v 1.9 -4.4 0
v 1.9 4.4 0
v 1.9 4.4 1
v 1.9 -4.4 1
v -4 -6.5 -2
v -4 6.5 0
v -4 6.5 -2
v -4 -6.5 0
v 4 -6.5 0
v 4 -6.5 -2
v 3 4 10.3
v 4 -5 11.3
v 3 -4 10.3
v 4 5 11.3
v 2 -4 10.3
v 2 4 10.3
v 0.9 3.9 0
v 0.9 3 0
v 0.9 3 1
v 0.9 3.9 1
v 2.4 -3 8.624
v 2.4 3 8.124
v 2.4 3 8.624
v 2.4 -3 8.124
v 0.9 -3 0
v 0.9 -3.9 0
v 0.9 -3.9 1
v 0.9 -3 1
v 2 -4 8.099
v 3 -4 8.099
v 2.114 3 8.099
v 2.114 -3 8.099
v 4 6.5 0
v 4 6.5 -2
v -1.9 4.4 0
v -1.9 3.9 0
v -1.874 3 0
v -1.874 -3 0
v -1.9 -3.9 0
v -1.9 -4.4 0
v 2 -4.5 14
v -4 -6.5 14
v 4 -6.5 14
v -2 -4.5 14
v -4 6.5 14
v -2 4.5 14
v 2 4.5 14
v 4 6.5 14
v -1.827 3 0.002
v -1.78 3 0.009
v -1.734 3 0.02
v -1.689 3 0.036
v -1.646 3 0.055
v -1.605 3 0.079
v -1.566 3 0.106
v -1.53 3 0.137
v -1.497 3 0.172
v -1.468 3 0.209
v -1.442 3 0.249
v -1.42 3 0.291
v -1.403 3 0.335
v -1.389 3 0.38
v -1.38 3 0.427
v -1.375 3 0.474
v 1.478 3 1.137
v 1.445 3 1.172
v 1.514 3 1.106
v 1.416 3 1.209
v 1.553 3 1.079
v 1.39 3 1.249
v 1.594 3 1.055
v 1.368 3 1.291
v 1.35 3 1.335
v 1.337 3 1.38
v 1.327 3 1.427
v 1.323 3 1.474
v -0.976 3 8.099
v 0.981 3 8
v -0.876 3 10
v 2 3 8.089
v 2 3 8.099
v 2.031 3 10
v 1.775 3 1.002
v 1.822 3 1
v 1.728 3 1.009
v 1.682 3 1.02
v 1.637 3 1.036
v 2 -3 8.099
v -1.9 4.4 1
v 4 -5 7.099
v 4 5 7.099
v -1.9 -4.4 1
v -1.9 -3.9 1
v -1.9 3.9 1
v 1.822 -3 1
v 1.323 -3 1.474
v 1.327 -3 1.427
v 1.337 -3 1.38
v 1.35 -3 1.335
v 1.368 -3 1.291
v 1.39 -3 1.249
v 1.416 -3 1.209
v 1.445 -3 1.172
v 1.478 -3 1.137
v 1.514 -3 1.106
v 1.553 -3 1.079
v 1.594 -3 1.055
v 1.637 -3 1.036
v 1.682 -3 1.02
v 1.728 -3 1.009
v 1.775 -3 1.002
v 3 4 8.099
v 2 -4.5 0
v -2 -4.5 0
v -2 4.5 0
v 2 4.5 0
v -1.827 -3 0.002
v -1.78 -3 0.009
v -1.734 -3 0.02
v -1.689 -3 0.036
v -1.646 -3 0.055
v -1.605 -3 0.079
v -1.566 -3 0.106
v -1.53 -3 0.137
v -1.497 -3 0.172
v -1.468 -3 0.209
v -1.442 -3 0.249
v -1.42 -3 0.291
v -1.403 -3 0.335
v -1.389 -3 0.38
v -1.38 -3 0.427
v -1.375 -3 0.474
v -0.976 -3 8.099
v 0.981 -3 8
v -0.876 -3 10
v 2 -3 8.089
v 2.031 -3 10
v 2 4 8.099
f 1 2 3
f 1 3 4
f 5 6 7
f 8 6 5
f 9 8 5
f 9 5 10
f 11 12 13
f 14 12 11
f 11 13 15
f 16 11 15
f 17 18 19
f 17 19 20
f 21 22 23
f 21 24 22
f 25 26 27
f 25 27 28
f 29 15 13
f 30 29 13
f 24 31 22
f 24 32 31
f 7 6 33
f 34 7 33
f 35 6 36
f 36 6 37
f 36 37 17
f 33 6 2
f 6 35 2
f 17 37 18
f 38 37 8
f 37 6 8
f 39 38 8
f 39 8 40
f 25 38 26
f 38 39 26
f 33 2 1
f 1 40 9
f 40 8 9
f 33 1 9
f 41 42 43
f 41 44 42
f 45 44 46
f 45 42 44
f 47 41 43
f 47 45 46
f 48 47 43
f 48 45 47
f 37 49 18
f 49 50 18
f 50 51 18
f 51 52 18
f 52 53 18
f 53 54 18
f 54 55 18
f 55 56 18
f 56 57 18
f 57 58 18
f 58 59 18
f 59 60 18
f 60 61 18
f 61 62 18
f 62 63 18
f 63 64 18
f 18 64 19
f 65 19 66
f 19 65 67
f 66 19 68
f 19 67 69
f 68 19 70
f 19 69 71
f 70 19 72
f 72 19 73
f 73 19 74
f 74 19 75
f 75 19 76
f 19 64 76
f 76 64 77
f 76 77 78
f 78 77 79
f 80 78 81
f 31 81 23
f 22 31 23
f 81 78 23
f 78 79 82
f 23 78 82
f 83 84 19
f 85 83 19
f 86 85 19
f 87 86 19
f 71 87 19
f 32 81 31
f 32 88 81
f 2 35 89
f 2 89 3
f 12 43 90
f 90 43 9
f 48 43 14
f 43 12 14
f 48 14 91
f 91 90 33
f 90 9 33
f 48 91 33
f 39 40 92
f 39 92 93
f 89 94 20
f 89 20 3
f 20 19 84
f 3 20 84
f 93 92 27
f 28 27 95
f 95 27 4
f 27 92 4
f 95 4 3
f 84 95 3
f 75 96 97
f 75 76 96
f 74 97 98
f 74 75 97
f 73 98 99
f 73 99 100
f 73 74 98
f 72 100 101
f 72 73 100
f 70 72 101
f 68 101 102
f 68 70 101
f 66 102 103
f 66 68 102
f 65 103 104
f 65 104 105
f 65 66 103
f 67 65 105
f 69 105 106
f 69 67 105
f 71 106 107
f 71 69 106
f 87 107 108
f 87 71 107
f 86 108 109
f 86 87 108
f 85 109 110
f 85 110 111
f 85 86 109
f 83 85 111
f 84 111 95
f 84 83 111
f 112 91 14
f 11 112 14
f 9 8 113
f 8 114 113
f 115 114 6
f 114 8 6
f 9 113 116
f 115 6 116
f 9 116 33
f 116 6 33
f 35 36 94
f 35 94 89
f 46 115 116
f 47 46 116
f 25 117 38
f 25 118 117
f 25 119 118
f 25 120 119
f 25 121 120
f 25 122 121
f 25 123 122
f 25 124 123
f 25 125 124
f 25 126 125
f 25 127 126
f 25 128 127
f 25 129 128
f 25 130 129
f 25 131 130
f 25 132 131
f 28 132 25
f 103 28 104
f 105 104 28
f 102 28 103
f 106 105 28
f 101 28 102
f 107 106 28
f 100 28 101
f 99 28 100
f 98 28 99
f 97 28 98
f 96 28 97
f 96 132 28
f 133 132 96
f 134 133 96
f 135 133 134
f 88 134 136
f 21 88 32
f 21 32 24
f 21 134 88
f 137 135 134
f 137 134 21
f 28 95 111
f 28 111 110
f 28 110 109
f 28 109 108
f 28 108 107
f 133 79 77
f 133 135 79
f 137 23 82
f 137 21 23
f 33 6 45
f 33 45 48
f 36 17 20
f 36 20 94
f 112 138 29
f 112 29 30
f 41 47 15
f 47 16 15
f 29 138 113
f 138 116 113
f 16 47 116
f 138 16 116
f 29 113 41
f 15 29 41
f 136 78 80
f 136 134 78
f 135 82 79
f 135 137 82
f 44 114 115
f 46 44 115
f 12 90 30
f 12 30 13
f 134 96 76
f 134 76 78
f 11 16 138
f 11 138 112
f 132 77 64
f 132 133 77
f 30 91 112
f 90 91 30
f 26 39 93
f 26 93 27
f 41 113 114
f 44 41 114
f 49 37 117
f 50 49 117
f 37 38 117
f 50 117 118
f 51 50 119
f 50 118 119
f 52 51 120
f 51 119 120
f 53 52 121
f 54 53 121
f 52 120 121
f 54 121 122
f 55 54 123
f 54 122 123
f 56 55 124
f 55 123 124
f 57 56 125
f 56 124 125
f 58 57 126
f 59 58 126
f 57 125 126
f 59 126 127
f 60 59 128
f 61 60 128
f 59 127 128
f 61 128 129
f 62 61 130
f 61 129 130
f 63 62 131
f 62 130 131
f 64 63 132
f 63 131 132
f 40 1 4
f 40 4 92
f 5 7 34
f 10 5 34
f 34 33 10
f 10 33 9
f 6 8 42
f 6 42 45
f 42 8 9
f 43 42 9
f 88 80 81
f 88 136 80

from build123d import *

# Parameters (mm, degrees)
F0_W          = 8
F0_H          = 13
F1_DEPTH      = 14
F3_W          = 8
F3_H          = 13
F3_W_2        = 4
F3_H_2        = 9
F3_W_3        = 2.8
F3_H_3        = 7.8
F4_DEPTH      = 2
F5_DEPTH      = 1
F6_DEPTH      = 3
F6_DEPTH_BACK = 3
F7_R          = 0.5
F8_DEPTH      = 4
F8_DEPTH_BACK = 4
F9_SIZE       = 1


with BuildPart() as f1:
    # F0 (on Top) → F1 (new body)
    with BuildSketch(Plane.XY):
        Rectangle(F0_W, F0_H)
        Polygon((-2, 0), (-2, 4.5), (0, 4.5), (2, 4.5), (2, 0), (2, -4.5), (0, -4.5), (-2, -4.5), align=None, mode=Mode.SUBTRACT)
    extrude(amount=F1_DEPTH)

    # F2 (on Front) → F8 (cut, two sides)
    with BuildSketch(Plane.XZ) as f8_sk:
        Polygon((2, 10.3), (2, 10), (2.03134729, 10), (2.4, 10), (2.4, 8.6241693561), (2.4, 8.1241693561), (2.4, 8.0991693561), (5.4, 8.0991693561), (5.4, 10.3), align=None)
        Polygon((-1.5, 8.0991693561), (-1.4, 8.0991693561), (-1.4, 10), (-0.8759222072, 10), (2, 10), (2, 10.3), (-1.5, 10.3), align=None)
        Polygon((-1.4, 8.0991693561), (-0.97554052, 8.0991693561), (-0.8759222072, 10), (-1.4, 10), align=None)
        Polygon((2.4, 10), (2.03134729, 10), (2.4, 8.6241693561), align=None)
        Polygon((-0.8759222072, 10), (-0.97554052, 8.0991693561), (2, 8.0991693561), (2, 10), align=None)
        Polygon((2, 10), (2, 8.0991693561), (2.1142486924, 8.0991693561), (2.4, 8.1241693561), (2.4, 8.6241693561), (2.03134729, 10), align=None)
        Polygon((2.4, 8.1241693561), (2.1142486924, 8.0991693561), (2.4, 8.0991693561), align=None)
    extrude(amount=-F8_DEPTH, mode=Mode.SUBTRACT)
    extrude(f8_sk.sketch, amount=F8_DEPTH_BACK, mode=Mode.SUBTRACT)

    # F9
    f9_edges = [f1.edges().sort_by_distance(p)[0] for p in [
        (4, 0, 10.3),
        (4, 4, 9.199585),
        (4, 0, 8.099169),
        (4, -4, 9.199585),
    ]]
    chamfer(f9_edges, length=F9_SIZE)


with BuildPart() as f4:
    # F3 (on face) → F4 (new body)
    with BuildSketch(Plane(origin=(0, 0, 0), x_dir=(1, 0, 0), z_dir=(0, 0, -1))):
        Rectangle(F3_W, F3_H)
        Rectangle(F3_W_2, F3_H_2, mode=Mode.SUBTRACT)
        Rectangle(F3_W_2, F3_H_2)
        Polygon((-1.9, 3.9), (-1.9, 4.4), (1.9, 4.4), (1.9, -4.4), (-1.9, -4.4), (-1.9, -3.9), align=None, mode=Mode.SUBTRACT)
        with Locations((-0.5, 0)):
            Rectangle(F3_W_3, F3_H_3)
        Polygon((1.9, 4.4), (-1.9, 4.4), (-1.9, 3.9), (0.9, 3.9), (0.9, -3.9), (-1.9, -3.9), (-1.9, -4.4), (1.9, -4.4), align=None)
    extrude(amount=F4_DEPTH)

    # F3 (on face) → F5 (join)
    with BuildSketch(Plane(origin=(0, 0, 0), x_dir=(1, 0, 0), z_dir=(0, 0, -1))):
        Polygon((1.9, 4.4), (-1.9, 4.4), (-1.9, 3.9), (0.9, 3.9), (0.9, -3.9), (-1.9, -3.9), (-1.9, -4.4), (1.9, -4.4), align=None)
    extrude(amount=-F5_DEPTH)

    # F2 (on Front) → F6 (join, two sides)
    with BuildSketch(Plane.XZ) as f6_sk:
        Polygon((-0.97554052, 8.0991693561), (-1.4, 0), (1.4, 0), (0.9807377657, 8), (2, 8.0891738907), (2, 8.0991693561), align=None)
        Polygon((2, 10), (2, 8.0991693561), (2.1142486924, 8.0991693561), (2.4, 8.1241693561), (2.4, 8.6241693561), (2.03134729, 10), align=None)
        Polygon((-0.8759222072, 10), (-0.97554052, 8.0991693561), (2, 8.0991693561), (2, 10), align=None)
    extrude(amount=F6_DEPTH)
    extrude(f6_sk.sketch, amount=-F6_DEPTH_BACK)

    # F7
    f7_edges = [f4.edges().sort_by_distance(p)[0] for p in [
        (-1.4, 0, 0),
        (1.347592, 0, 1),
    ]]
    fillet(f7_edges, radius=F7_R)


solid = Compound([f1.part, f4.part])
